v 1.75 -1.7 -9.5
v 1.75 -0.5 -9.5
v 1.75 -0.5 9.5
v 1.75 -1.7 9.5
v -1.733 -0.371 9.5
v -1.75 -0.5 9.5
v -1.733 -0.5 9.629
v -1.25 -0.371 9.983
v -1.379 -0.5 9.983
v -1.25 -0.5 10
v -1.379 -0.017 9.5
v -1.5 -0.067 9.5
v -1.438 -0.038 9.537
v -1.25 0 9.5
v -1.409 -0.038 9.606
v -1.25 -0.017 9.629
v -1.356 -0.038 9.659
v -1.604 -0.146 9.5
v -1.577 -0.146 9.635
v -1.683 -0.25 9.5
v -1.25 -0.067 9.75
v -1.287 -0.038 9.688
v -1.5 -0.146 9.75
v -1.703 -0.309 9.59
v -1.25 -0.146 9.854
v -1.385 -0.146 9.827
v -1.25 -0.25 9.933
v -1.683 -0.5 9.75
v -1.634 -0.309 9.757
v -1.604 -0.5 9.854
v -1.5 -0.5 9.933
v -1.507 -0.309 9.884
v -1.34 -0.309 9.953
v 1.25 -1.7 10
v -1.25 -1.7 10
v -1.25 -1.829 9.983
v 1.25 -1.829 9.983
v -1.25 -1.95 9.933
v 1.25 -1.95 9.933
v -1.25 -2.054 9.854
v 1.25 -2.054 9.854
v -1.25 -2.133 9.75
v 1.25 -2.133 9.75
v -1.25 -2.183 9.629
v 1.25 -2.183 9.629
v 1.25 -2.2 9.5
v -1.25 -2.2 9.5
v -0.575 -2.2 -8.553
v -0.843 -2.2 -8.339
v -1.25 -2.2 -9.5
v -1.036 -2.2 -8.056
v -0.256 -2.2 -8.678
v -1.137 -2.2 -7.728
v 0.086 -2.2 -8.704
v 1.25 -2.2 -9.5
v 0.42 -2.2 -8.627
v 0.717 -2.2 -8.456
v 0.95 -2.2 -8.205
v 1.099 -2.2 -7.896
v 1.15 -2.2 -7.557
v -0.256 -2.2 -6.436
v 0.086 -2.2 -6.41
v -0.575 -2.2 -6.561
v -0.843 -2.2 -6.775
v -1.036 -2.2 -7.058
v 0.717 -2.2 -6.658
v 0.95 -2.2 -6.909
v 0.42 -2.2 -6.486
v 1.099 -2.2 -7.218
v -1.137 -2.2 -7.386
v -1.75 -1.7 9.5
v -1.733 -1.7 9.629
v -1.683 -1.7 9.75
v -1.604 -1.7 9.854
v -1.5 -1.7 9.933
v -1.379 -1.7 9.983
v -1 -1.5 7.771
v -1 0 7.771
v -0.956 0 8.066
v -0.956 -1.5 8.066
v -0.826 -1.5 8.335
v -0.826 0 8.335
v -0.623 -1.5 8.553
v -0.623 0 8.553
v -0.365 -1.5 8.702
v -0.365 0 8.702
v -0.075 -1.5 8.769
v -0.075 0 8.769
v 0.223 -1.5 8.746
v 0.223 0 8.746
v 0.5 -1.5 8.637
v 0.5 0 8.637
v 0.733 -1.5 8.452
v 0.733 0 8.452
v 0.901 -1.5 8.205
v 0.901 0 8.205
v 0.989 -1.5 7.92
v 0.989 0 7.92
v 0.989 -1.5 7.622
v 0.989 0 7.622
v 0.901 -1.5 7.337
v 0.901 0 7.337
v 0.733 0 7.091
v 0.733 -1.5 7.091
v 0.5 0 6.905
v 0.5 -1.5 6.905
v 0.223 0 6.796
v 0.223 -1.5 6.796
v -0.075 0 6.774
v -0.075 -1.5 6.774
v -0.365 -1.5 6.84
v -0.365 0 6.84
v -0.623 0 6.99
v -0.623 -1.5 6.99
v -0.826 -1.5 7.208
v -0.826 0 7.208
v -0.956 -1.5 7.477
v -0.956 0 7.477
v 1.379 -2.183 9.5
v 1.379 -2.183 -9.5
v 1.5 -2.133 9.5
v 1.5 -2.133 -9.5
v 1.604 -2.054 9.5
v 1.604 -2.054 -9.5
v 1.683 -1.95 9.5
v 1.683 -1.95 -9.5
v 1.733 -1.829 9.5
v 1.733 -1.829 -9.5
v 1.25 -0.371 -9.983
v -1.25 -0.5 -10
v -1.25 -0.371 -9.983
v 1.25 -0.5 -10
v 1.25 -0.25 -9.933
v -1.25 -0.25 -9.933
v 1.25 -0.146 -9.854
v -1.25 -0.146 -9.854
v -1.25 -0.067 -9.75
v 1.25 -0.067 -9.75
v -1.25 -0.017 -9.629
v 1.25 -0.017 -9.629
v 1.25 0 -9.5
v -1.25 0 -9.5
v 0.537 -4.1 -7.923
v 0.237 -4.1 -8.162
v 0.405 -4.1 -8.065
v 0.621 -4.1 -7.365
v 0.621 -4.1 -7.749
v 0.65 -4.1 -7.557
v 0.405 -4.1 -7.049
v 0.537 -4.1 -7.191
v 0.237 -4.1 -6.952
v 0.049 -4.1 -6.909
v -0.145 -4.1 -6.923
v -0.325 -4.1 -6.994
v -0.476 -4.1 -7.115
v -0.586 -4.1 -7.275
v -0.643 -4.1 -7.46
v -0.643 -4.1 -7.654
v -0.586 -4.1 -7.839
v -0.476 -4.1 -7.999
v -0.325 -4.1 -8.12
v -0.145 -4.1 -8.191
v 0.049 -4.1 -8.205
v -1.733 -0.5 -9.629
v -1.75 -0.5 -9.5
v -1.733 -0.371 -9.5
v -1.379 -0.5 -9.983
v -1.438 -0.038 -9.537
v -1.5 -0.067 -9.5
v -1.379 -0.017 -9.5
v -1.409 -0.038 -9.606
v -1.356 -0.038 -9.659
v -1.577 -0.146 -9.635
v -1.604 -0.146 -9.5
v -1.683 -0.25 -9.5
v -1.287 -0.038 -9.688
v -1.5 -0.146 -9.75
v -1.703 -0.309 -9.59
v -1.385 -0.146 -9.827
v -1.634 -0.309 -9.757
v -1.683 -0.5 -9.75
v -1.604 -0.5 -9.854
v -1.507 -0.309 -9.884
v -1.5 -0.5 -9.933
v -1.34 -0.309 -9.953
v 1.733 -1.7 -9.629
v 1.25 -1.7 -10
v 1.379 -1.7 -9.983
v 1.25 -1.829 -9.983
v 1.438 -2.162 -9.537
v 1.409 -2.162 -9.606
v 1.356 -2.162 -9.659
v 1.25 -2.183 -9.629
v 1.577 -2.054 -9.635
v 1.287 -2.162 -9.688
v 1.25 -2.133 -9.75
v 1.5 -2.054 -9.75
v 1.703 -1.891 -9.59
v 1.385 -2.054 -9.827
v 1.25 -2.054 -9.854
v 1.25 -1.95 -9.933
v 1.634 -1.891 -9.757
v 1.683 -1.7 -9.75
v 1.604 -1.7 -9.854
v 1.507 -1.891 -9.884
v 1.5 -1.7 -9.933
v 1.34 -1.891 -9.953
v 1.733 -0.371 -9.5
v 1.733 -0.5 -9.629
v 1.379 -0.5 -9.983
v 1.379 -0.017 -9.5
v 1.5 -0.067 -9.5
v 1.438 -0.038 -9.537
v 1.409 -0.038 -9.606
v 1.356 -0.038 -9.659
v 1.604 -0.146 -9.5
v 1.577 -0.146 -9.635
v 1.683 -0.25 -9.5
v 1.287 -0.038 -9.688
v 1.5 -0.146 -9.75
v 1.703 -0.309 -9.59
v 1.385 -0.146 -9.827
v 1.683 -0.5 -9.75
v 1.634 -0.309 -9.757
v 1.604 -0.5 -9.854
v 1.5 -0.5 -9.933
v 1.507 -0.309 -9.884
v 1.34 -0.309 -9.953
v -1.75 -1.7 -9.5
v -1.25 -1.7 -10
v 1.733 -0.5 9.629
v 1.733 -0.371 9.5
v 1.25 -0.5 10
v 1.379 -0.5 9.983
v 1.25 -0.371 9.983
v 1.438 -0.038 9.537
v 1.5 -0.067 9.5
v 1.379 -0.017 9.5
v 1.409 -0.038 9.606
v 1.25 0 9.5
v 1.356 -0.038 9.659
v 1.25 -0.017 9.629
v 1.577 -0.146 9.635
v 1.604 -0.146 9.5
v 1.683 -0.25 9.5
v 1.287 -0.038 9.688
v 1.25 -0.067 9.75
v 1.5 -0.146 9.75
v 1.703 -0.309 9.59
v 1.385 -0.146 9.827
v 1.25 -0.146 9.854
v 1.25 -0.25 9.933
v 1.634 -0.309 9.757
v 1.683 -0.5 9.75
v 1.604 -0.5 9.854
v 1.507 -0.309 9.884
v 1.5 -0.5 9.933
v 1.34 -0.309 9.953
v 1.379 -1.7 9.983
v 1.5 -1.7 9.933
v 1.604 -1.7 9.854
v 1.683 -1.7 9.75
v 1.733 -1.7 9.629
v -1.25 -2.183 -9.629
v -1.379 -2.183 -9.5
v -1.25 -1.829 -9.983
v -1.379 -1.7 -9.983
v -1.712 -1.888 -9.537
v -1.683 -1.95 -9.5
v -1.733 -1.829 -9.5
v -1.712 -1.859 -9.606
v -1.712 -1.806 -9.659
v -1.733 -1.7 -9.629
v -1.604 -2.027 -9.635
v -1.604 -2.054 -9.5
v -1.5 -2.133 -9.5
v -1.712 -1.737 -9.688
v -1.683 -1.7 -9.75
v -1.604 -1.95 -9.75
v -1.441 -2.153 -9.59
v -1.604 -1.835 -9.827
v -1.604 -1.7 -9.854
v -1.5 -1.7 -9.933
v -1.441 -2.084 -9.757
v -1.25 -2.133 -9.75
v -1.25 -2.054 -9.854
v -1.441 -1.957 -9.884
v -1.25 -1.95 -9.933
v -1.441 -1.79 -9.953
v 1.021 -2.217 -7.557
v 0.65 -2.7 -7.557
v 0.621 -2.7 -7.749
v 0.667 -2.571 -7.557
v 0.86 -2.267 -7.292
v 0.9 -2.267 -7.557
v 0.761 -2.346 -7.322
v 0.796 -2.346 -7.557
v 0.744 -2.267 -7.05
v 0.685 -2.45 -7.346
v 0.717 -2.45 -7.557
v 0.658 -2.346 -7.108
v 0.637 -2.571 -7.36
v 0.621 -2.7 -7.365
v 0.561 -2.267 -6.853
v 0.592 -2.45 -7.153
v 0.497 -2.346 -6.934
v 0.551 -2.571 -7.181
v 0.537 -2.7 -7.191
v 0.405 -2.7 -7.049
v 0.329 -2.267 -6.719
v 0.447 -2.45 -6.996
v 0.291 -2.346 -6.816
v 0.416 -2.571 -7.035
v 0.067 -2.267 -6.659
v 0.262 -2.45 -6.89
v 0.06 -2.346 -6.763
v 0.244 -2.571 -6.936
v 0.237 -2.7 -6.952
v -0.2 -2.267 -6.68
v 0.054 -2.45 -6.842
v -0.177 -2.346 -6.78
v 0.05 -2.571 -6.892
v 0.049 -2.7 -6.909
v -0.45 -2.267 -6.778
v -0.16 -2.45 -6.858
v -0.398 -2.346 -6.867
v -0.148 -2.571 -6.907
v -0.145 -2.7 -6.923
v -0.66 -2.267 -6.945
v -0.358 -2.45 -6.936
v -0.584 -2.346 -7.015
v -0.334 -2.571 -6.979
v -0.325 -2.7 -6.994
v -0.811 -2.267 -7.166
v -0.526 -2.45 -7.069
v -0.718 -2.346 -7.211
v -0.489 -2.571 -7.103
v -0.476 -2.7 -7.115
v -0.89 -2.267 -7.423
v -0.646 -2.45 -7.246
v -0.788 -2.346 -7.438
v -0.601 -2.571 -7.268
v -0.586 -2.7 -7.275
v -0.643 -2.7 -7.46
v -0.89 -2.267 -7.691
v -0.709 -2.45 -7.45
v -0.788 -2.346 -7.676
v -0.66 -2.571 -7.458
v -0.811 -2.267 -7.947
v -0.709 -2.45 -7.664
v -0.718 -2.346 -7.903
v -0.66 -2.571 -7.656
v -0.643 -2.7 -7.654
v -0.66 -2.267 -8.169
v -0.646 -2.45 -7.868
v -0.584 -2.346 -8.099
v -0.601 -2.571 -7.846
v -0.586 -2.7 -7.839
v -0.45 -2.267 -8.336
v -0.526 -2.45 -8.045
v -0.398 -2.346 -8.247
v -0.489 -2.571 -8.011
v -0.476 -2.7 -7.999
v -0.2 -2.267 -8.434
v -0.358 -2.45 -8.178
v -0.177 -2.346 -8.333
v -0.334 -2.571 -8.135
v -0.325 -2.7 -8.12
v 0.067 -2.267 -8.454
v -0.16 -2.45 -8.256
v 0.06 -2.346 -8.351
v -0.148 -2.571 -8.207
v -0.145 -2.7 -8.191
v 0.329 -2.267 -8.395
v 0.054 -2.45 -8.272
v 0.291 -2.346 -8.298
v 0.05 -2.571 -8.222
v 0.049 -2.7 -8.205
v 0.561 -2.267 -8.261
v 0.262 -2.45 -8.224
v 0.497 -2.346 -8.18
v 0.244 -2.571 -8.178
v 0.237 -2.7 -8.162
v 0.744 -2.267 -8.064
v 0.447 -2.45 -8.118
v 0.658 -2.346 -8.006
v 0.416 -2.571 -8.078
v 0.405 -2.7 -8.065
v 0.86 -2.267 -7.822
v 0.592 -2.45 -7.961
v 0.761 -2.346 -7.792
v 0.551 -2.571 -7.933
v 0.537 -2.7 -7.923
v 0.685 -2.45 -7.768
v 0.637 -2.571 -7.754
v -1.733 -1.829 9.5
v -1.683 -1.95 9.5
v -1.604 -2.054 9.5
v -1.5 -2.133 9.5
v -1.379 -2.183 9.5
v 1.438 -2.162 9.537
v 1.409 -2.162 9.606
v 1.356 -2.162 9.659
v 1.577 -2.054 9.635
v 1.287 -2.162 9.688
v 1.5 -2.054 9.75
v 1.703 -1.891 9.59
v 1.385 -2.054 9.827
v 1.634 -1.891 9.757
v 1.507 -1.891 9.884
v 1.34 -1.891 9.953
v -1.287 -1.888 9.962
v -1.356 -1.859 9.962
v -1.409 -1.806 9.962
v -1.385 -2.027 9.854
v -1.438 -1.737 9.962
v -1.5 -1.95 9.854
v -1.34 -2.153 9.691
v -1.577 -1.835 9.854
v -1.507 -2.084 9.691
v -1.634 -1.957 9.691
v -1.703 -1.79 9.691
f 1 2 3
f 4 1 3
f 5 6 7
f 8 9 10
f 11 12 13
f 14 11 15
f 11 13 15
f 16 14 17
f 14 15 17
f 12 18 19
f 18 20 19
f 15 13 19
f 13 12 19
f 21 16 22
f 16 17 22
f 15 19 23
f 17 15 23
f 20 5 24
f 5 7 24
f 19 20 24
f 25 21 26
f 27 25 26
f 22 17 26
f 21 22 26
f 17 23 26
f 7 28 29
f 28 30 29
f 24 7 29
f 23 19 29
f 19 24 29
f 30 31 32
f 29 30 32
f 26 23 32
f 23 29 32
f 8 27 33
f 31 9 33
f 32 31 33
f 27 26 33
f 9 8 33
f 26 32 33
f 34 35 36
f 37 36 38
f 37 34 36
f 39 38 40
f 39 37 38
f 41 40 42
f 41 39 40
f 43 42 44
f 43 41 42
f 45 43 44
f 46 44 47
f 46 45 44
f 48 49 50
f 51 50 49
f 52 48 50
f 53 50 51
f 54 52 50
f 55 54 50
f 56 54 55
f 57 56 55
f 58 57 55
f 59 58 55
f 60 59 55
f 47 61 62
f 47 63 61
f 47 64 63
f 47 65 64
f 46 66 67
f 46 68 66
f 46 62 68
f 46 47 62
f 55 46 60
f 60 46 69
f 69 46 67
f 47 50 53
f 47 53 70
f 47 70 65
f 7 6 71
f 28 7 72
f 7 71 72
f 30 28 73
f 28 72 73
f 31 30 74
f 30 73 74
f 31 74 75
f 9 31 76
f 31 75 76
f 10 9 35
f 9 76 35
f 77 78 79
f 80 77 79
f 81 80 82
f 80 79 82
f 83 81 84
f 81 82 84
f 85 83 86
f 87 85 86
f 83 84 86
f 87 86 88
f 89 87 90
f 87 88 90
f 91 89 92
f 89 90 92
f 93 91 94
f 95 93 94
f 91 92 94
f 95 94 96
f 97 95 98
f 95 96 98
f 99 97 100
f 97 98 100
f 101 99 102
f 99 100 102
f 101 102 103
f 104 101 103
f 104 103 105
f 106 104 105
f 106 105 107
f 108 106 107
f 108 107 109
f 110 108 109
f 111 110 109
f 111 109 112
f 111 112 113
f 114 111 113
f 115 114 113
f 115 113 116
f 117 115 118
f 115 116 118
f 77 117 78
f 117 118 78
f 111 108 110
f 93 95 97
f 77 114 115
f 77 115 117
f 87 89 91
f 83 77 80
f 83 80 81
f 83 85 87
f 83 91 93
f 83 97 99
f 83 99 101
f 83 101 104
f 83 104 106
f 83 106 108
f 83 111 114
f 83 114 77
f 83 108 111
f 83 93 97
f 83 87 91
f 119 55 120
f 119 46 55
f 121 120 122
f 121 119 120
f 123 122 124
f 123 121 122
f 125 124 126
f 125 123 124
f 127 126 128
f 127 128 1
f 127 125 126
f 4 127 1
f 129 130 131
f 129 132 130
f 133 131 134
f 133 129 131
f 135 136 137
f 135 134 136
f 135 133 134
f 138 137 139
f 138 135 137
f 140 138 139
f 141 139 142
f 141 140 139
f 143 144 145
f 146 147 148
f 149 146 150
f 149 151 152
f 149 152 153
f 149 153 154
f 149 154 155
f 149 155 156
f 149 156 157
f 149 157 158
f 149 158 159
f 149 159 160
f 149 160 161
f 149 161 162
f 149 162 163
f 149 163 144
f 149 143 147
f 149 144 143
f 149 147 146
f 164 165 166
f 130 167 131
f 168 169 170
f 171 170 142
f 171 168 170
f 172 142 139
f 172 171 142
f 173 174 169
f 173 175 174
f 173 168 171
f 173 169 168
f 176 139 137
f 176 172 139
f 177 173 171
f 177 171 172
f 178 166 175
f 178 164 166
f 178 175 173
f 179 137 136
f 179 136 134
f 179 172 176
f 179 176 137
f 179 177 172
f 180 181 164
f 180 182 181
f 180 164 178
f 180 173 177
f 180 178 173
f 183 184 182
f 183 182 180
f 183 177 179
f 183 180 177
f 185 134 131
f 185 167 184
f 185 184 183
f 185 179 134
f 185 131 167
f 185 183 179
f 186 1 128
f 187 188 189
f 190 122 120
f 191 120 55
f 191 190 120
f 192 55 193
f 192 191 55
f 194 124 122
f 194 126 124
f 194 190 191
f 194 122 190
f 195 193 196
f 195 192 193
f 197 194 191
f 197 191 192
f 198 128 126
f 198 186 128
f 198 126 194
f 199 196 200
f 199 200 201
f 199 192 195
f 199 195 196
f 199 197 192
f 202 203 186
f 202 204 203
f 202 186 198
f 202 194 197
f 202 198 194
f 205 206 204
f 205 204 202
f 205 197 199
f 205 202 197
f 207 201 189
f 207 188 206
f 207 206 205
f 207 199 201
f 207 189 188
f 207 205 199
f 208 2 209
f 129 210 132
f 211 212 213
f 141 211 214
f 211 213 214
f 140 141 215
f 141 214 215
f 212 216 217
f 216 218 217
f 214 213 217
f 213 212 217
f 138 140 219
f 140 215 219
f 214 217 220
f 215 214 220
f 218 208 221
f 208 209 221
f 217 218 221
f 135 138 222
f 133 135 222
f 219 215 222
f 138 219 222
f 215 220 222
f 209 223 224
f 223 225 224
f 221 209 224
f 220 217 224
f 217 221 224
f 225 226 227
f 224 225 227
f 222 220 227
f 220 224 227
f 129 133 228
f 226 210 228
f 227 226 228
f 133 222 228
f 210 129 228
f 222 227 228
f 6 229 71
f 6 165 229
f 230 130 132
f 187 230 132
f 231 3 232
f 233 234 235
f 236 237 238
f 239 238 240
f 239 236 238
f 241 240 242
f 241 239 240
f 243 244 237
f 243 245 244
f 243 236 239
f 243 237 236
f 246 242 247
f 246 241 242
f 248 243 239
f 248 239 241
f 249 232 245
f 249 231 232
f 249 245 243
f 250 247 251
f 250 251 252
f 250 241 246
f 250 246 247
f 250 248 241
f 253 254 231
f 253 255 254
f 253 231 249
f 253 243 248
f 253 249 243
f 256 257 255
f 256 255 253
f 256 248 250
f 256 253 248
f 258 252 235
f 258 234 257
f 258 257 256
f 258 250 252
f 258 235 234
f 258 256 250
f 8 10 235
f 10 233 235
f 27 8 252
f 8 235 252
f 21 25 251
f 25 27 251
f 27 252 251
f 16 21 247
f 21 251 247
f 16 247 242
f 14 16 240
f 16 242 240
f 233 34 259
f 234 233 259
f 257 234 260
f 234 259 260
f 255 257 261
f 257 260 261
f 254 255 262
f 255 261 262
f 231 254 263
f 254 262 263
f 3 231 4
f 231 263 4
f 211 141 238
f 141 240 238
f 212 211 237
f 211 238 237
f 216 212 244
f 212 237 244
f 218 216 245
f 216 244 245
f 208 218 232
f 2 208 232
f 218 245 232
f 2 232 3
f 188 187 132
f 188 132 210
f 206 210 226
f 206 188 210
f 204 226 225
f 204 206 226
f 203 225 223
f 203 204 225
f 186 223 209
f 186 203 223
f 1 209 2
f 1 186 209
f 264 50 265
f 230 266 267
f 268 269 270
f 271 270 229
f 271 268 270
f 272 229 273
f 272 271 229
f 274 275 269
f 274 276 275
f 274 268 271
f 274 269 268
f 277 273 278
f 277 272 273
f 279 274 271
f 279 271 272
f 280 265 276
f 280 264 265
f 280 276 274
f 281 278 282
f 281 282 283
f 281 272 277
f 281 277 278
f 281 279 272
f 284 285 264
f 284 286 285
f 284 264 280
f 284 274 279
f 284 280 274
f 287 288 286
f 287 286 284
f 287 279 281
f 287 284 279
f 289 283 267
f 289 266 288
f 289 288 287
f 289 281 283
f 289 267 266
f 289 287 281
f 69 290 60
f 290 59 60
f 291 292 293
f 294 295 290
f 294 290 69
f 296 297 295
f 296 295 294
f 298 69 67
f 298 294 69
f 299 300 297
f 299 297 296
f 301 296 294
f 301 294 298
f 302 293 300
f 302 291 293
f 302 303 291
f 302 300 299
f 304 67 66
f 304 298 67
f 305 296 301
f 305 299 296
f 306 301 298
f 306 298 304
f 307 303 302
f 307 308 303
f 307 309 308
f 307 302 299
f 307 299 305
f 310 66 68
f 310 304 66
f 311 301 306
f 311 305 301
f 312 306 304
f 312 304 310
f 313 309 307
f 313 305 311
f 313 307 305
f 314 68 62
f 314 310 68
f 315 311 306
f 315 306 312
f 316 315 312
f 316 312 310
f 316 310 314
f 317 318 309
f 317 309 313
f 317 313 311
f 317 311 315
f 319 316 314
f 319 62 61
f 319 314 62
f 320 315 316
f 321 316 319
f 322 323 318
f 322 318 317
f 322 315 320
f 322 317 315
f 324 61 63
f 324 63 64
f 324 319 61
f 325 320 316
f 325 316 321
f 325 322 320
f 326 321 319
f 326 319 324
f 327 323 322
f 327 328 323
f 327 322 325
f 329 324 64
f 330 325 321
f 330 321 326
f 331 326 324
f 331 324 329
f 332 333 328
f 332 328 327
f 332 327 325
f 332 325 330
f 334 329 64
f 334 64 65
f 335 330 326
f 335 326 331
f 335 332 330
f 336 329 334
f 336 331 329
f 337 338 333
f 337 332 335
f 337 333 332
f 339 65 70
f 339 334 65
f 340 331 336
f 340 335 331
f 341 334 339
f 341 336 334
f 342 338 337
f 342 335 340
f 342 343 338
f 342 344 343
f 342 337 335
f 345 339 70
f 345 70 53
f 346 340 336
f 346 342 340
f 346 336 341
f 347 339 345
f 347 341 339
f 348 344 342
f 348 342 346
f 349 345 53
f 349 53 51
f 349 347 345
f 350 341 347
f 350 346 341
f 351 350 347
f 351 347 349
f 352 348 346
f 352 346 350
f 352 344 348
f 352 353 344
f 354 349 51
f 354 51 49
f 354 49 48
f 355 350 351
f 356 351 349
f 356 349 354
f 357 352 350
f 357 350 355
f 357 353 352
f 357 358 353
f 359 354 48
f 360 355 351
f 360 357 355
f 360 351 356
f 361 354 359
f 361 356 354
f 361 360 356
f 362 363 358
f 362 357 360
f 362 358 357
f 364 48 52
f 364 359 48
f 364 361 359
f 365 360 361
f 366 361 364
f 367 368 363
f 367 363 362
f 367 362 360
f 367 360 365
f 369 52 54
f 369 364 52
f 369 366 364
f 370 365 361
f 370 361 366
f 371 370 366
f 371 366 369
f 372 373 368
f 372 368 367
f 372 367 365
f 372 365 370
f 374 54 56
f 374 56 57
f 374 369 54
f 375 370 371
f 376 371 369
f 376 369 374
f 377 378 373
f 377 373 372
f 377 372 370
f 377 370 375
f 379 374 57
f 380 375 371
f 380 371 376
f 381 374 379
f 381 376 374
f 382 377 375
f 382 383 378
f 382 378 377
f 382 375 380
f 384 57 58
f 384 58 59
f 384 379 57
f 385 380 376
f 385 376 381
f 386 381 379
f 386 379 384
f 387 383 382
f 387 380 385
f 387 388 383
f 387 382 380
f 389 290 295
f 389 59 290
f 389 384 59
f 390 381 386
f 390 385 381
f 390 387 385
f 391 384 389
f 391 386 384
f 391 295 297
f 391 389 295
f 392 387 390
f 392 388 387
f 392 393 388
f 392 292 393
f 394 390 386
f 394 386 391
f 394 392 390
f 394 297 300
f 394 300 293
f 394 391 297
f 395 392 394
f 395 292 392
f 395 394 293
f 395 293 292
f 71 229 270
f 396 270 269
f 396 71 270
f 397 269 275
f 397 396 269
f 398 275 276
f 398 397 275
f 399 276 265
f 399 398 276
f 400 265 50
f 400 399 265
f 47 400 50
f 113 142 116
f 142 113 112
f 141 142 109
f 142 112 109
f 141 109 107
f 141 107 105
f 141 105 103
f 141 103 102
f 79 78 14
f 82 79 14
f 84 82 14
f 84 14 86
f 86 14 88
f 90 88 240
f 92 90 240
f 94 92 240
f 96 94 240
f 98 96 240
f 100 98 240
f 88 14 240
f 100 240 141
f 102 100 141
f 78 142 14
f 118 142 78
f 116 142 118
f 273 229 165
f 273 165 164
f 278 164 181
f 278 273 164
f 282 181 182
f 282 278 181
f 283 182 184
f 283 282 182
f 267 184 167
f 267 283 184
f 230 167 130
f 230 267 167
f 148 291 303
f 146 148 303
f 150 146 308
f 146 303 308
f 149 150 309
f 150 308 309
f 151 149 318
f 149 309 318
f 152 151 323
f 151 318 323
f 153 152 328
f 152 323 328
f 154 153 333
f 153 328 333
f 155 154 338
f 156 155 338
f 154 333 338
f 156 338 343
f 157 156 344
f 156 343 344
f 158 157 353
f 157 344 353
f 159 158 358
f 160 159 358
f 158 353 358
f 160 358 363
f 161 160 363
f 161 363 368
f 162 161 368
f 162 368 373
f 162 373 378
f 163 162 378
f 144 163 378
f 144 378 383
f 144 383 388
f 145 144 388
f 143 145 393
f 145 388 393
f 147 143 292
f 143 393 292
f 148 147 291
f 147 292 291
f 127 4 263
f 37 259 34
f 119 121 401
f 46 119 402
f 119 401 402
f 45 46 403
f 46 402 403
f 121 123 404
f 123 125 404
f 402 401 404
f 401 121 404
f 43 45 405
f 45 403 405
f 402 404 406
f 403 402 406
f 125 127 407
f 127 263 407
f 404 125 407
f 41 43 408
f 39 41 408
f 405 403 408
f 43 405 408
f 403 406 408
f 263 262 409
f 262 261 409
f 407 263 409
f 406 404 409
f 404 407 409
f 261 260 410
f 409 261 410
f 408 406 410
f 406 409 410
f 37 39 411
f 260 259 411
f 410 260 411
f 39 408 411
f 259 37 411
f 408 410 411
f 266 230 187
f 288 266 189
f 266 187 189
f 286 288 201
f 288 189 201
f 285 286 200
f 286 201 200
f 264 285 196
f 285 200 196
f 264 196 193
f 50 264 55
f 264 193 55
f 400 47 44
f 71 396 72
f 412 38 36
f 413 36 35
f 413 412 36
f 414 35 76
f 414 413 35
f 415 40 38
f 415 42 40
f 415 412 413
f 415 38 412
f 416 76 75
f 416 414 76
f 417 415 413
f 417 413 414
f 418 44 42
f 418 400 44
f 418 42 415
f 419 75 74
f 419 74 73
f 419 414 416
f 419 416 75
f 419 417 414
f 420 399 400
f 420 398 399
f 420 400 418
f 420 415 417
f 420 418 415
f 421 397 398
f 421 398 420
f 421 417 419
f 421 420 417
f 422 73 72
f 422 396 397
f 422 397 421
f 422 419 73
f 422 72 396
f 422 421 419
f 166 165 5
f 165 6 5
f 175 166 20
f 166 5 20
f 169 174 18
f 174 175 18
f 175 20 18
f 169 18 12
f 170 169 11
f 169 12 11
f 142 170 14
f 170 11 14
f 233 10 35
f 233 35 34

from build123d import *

# Parameters (mm, degrees)
F0_W     = 3.5
F0_H     = 20
F1_DEPTH = 2.2
F2_R     = 1
F3_DEPTH = 1.5
F4_R     = 0.65
F5_DEPTH = 1.9
F6_R     = 0.5


with BuildPart() as f1:
    # F0 (on Front) → F1 (new body)
    with BuildSketch(Plane.XZ):
        Rectangle(F0_W, F0_H)
    extrude(amount=F1_DEPTH)

    # F2 (on face) → F3 (cut)
    with BuildSketch(Plane(origin=(0, 0, 0), x_dir=(-1, 0, 0), z_dir=(0, 1, 0))):
        with Locations((0, 7.771334)):
            Circle(F2_R)
    extrude(amount=-F3_DEPTH, mode=Mode.SUBTRACT)

    # F4 (on face) → F5 (join)
    with BuildSketch(Plane.XZ.offset(2.2)):
        with Locations((0, -7.556978)):
            Circle(F4_R)
    extrude(amount=F5_DEPTH)

    # F6
    f6_edges = [f1.edges().sort_by_distance(p)[0] for p in [
        (1.75, -1.1, -10),
        (1.75, -1.1, 10),
        (1.75, 0, 0),
        (1.75, -2.2, 0),
        (0, -2.2, -10),
        (-1.75, -2.2, 0),
        (0, -2.2, 10),
        (-0.65, -2.2, -7.556978),
        (-1.75, -1.1, 10),
        (-1.75, -1.1, -10),
        (-1.75, 0, 0),
        (0, 0, 10),
        (0, 0, -10),
    ]]
    fillet(f6_edges, radius=F6_R)


solid = f1.part
